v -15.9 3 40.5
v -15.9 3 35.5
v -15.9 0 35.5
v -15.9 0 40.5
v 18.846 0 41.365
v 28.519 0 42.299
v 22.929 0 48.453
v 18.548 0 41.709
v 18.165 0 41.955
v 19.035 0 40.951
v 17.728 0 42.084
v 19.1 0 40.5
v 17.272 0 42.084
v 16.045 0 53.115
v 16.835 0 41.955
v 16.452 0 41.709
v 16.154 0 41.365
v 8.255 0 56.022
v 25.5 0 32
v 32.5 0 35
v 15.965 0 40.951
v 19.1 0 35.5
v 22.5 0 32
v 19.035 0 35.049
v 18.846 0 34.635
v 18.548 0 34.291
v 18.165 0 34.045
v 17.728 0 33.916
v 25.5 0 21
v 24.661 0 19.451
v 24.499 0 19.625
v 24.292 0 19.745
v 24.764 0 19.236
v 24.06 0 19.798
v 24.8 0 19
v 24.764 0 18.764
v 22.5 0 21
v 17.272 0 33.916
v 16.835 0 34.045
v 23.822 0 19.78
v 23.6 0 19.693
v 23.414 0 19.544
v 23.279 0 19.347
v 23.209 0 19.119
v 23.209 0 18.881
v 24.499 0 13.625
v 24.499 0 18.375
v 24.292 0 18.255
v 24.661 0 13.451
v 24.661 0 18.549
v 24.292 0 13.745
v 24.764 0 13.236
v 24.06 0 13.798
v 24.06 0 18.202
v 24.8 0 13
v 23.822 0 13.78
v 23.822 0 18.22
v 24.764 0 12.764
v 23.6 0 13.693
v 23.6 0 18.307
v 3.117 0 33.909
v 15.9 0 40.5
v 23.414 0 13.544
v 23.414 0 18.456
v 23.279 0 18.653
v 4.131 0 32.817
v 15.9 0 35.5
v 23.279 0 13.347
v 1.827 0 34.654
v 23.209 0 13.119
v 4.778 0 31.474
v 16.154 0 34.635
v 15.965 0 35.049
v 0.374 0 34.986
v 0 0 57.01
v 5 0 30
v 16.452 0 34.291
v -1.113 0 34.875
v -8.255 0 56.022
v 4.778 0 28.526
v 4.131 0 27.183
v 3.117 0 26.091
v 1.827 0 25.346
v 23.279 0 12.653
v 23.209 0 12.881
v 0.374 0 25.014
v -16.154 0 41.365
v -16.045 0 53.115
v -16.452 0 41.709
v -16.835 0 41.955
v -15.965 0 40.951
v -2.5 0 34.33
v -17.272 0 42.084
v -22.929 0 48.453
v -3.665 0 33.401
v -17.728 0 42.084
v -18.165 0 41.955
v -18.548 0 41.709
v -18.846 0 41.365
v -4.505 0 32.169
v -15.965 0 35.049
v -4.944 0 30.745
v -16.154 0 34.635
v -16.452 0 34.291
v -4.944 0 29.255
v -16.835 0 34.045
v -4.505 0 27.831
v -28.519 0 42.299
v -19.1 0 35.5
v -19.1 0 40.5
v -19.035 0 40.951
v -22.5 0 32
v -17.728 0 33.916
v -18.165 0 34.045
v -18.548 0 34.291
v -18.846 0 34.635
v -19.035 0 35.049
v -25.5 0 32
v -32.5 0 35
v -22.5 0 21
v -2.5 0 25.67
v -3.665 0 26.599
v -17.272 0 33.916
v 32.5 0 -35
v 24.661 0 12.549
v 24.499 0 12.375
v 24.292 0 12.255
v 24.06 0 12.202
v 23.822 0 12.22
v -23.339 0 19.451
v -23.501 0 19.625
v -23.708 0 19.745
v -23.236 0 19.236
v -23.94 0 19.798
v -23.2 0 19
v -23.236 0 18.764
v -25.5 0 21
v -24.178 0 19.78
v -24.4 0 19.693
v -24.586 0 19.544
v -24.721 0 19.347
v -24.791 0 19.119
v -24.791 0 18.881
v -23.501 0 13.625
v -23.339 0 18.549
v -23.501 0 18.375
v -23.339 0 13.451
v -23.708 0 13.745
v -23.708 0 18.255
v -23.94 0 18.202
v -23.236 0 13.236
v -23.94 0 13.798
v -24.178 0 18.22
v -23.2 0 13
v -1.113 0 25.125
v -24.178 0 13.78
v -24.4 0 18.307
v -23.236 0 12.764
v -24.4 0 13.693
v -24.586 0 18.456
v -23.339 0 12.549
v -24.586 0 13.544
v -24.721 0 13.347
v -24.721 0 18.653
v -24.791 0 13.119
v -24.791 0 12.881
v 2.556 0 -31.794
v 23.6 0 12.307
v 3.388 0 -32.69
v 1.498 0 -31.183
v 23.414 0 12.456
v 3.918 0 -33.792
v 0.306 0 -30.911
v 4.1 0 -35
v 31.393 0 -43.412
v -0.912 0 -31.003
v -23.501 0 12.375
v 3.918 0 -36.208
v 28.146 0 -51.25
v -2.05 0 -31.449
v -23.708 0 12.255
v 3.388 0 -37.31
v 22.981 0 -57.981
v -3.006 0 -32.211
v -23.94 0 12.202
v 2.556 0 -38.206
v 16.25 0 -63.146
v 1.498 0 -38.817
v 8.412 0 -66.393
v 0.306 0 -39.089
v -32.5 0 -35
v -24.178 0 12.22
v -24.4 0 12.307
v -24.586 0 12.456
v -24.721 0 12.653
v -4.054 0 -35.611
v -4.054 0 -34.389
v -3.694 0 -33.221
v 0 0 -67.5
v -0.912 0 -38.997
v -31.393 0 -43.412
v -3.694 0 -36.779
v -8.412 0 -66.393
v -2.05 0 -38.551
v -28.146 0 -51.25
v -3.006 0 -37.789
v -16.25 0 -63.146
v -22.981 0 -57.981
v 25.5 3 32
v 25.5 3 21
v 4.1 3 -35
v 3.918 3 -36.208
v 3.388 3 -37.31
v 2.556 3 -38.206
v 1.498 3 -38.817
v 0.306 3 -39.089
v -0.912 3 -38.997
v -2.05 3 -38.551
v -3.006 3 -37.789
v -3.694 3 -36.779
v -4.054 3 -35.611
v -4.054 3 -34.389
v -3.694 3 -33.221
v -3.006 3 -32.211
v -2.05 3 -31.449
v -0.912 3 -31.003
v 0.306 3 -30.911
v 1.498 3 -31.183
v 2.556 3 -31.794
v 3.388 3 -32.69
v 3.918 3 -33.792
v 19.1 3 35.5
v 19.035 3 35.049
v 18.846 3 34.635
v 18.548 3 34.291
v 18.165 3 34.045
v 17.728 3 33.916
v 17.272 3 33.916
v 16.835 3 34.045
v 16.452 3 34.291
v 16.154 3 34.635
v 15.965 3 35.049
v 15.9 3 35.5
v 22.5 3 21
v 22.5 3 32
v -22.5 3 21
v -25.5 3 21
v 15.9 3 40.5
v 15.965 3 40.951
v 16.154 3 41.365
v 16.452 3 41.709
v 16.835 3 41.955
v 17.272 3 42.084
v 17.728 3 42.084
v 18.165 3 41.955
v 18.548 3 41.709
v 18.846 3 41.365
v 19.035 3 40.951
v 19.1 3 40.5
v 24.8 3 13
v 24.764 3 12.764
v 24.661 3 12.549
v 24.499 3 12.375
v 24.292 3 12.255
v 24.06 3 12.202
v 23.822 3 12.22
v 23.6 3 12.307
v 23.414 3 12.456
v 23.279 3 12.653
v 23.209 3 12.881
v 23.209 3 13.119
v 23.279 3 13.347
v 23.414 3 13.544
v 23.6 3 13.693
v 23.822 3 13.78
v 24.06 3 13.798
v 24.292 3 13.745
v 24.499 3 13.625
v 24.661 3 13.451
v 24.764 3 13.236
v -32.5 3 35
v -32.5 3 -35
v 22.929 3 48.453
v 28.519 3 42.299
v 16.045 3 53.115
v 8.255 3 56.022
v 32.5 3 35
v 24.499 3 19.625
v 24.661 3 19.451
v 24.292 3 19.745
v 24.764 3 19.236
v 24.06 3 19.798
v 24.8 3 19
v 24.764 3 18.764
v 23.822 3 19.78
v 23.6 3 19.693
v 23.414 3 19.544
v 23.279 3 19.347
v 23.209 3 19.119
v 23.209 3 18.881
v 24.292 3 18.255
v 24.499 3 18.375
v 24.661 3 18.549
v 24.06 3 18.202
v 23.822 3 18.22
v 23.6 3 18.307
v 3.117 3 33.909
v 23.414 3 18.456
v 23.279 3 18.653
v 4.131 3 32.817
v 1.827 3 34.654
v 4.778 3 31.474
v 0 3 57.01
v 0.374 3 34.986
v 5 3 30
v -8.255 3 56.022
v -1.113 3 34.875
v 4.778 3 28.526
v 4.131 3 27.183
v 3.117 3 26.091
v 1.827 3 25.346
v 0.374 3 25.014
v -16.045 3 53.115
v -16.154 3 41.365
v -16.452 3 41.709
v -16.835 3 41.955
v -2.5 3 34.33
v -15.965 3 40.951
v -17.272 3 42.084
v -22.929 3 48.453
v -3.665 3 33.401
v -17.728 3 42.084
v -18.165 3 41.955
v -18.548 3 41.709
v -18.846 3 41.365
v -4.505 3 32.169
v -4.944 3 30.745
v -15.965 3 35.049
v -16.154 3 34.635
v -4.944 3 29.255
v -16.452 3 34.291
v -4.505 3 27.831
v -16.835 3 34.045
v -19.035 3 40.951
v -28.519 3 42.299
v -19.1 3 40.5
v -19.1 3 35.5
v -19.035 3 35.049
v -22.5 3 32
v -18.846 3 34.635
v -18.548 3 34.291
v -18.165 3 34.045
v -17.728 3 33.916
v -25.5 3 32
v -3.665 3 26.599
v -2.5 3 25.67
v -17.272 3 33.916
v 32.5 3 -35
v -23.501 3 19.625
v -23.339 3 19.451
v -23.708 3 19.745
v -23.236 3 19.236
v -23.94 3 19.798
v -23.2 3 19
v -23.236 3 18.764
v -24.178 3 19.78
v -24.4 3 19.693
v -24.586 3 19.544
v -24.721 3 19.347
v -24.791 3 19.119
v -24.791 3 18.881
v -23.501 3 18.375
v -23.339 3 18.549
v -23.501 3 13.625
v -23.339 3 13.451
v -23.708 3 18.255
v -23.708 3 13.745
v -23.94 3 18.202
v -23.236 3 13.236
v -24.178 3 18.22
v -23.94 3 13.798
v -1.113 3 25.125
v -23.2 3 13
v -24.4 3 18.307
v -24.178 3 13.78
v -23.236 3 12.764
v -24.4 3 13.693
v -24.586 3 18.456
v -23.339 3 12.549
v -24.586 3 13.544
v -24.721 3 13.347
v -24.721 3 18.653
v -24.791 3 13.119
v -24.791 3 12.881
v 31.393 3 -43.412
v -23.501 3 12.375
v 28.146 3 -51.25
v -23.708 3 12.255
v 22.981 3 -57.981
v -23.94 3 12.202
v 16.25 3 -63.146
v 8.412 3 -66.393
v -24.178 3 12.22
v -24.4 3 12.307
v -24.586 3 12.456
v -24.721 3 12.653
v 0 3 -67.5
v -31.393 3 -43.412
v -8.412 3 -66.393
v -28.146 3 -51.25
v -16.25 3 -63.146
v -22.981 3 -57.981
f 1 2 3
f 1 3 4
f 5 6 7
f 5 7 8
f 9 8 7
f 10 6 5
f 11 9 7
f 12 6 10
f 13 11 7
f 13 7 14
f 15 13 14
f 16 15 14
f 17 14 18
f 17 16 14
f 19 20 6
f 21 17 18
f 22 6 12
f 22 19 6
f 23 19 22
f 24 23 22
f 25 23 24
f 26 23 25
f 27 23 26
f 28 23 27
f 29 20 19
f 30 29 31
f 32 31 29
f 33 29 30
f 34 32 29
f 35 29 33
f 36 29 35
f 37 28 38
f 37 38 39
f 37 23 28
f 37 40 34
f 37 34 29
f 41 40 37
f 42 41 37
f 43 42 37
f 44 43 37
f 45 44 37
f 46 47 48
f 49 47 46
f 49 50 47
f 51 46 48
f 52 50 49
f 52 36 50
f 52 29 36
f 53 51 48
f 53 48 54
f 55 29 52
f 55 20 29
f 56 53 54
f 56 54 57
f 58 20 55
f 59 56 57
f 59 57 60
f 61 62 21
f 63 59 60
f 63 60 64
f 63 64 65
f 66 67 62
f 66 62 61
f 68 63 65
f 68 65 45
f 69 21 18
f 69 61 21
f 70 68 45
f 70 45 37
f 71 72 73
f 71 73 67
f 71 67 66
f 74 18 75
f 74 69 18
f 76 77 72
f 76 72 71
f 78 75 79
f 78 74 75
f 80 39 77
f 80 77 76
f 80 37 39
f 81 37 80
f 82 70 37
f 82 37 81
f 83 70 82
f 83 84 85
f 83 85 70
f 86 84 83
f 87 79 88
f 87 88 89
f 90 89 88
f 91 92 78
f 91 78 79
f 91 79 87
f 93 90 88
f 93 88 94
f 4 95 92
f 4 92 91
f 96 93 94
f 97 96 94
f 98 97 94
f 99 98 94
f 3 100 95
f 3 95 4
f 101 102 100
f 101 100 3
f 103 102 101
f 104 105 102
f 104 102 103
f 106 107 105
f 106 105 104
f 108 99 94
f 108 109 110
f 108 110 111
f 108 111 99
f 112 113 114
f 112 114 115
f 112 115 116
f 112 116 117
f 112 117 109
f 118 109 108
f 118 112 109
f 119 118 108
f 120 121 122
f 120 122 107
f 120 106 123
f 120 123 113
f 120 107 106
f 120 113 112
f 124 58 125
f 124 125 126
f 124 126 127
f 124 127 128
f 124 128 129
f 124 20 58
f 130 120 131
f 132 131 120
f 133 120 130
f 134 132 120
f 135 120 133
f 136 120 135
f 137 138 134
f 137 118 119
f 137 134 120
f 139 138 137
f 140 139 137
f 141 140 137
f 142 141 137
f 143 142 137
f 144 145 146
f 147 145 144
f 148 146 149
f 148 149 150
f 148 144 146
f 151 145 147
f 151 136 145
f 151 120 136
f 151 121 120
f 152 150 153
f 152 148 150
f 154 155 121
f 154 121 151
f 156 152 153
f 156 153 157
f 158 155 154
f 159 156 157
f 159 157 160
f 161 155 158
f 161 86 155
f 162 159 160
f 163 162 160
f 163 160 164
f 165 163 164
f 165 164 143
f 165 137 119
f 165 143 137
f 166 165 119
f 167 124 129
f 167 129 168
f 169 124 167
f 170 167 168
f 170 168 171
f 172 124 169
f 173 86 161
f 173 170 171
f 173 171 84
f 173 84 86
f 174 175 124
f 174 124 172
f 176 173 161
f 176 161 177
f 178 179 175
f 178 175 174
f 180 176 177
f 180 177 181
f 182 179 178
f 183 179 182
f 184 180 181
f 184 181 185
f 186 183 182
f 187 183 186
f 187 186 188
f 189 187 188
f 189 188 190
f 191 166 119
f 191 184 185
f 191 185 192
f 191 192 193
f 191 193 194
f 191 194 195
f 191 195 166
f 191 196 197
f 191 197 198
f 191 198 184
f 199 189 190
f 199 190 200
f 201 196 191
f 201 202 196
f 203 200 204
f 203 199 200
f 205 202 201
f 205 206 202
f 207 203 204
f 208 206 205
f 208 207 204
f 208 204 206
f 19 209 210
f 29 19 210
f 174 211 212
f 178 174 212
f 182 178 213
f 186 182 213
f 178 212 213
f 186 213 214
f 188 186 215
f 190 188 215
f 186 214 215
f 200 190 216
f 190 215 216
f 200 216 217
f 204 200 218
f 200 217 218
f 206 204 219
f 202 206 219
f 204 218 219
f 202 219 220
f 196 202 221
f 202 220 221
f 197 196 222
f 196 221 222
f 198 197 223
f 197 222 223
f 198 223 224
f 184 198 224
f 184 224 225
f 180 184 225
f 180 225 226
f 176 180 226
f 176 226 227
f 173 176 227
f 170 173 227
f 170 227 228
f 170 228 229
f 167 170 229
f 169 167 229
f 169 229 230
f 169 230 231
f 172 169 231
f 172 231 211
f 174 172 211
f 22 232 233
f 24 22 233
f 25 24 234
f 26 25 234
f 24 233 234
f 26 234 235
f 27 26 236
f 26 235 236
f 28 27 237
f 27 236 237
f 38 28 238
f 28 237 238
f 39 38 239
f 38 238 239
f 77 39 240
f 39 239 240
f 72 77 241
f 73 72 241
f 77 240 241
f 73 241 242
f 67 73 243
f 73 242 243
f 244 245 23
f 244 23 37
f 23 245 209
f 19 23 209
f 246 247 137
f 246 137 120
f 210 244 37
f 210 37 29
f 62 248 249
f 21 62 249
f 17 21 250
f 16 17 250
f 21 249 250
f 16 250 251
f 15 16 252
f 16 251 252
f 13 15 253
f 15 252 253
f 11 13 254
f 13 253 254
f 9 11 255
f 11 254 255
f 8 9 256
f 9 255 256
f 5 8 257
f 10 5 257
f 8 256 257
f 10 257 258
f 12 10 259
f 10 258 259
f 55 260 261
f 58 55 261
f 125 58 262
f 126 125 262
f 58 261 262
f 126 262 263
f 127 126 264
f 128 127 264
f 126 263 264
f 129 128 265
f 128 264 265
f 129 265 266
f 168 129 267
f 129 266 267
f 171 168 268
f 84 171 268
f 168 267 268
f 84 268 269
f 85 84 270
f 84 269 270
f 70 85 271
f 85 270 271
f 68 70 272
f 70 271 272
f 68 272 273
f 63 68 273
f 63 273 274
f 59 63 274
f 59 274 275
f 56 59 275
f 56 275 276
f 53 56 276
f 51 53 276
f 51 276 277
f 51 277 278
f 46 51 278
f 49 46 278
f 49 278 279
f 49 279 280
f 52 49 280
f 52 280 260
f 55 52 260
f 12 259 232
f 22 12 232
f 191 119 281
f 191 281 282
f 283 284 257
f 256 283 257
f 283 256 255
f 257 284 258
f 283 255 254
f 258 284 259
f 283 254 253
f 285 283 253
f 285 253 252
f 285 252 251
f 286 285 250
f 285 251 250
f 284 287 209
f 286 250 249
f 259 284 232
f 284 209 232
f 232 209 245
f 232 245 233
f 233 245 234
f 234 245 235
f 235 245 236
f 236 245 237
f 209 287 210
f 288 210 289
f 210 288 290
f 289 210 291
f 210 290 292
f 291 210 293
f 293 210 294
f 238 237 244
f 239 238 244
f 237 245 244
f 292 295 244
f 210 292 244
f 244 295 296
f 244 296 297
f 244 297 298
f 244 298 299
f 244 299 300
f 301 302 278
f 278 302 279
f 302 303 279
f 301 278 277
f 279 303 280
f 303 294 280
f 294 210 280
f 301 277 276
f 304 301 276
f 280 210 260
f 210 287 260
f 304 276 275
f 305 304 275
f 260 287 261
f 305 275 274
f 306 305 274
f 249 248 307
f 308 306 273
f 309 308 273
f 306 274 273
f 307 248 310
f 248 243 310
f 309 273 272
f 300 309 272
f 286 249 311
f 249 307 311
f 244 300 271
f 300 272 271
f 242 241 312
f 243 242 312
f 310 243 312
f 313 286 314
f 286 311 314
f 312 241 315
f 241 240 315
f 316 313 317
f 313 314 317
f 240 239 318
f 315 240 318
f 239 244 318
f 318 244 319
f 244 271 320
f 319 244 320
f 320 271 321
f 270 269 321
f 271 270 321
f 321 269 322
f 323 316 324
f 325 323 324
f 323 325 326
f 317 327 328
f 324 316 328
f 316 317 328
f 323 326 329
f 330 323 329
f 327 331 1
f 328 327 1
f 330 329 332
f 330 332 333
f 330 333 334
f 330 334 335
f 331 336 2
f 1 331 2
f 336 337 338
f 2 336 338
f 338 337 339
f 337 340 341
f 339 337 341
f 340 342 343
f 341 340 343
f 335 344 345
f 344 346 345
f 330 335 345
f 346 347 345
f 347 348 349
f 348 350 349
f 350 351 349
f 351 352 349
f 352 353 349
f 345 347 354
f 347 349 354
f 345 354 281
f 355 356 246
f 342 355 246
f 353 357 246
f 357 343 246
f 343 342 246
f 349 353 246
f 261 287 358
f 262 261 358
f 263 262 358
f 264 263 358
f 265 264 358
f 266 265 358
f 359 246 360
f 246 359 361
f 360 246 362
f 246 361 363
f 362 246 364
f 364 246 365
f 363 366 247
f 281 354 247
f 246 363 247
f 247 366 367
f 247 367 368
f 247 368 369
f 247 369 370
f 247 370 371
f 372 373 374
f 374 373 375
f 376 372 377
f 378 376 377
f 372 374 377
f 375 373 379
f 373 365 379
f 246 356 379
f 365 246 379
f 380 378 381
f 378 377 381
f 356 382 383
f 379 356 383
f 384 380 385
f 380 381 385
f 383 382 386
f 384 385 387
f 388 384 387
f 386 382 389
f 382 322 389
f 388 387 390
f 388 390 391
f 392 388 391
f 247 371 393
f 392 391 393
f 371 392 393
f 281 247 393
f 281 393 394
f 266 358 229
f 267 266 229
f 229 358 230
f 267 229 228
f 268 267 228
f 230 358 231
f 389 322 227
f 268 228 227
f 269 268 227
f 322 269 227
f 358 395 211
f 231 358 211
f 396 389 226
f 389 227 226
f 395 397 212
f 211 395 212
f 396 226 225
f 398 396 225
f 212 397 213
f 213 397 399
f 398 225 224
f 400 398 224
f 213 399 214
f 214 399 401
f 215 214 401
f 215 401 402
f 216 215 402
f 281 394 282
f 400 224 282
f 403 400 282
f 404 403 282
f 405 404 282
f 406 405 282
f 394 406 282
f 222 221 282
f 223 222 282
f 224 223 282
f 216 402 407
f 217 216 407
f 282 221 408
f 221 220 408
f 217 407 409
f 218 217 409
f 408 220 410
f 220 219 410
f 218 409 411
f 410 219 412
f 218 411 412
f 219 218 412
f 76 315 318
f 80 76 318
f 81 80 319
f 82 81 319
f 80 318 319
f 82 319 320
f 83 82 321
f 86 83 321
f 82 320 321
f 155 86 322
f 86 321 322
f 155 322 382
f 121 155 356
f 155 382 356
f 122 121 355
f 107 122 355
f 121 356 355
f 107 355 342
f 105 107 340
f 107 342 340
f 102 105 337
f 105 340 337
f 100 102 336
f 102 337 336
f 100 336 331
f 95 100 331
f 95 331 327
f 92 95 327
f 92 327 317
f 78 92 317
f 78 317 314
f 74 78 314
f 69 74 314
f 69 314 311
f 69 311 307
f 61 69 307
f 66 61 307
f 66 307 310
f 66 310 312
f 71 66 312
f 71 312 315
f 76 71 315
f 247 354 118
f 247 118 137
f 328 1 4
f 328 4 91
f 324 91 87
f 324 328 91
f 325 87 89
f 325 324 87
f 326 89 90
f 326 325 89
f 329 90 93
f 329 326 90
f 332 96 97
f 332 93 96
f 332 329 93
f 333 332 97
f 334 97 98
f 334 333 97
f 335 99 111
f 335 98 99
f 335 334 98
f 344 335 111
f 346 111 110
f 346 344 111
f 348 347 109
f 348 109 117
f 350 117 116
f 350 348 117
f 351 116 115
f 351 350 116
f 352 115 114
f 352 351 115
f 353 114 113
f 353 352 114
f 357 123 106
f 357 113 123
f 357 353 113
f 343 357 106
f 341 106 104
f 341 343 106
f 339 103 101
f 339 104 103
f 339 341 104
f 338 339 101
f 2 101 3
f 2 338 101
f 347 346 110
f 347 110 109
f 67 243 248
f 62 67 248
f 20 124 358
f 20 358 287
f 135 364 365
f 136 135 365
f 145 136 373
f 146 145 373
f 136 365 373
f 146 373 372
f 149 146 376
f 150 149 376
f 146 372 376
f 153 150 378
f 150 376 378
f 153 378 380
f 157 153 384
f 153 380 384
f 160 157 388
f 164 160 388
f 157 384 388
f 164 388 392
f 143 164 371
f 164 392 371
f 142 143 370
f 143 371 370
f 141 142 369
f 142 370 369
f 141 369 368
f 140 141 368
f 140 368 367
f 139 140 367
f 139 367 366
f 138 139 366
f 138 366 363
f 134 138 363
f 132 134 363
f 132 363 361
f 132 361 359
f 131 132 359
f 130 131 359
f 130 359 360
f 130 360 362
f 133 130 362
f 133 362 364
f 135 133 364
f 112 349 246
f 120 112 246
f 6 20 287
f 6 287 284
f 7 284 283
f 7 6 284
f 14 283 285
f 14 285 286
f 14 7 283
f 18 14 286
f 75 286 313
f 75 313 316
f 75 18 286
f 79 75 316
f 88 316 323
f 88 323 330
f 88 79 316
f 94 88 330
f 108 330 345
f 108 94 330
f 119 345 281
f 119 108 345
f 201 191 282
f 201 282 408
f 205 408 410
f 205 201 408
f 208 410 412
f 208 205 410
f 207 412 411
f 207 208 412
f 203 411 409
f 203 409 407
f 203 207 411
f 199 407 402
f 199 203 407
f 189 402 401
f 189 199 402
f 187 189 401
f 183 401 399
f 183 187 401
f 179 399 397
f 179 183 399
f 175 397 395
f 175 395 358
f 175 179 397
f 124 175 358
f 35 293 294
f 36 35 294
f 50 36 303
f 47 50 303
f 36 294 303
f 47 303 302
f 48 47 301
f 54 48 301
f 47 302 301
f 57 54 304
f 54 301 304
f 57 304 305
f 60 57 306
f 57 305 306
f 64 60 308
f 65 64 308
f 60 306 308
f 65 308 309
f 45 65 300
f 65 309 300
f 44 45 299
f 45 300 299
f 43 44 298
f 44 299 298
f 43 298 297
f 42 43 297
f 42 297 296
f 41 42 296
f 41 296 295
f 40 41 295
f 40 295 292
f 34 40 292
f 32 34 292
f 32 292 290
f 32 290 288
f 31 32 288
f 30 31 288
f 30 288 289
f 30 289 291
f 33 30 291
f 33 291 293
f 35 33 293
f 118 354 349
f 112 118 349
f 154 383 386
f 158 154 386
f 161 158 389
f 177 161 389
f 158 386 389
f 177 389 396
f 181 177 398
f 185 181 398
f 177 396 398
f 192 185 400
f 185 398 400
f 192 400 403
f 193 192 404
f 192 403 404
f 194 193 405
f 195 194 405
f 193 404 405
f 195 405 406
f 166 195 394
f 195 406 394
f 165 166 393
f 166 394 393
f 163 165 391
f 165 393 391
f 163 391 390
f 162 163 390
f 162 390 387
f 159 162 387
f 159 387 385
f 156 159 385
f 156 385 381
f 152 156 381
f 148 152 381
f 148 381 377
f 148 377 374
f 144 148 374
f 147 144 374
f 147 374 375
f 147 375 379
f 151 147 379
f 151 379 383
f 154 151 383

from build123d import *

# Parameters (mm, degrees)
BOSS_EXTRUDE1_DEPTH = 3
SKETCH2_R           = 4.1
SKETCH2_R_2         = 5
SKETCH2_R_3         = 1.6
CUT_EXTRUDE1_DEPTH  = 4
SKETCH3_R           = 0.8
SKETCH3_W           = 3
SKETCH3_H           = 11
CUT_EXTRUDE2_DEPTH  = 4
CUT_EXTRUDE3_DEPTH  = 4


with BuildPart() as part:
    # Sketch1 → Boss-Extrude1 (new body)
    with BuildSketch(Plane(origin=(0, 0, 0), x_dir=(1, 0, 0), z_dir=(0, 1, 0))):
        with BuildLine():
            Line((-32.5, -35), (-32.5, 35))
            ThreePointArc((-32.5, 35), (0, 67.5), (32.5, 35))
            Line((32.5, 35), (32.5, -35))
            ThreePointArc((32.5, -35), (0, -57.009618943), (-32.5, -35))
        make_face()
    extrude(amount=BOSS_EXTRUDE1_DEPTH)

    # Sketch2 → Cut-Extrude1 (cut, through all)
    with BuildSketch(Plane(origin=(0, 3, 0), x_dir=(1, 0, 0), z_dir=(0, 1, 0))):
        with Locations((0, 35)):
            Circle(SKETCH2_R)
        with Locations((0, -30)):
            Circle(SKETCH2_R_2)
        with Locations((-17.5, -38)):
            Circle(SKETCH2_R_3)
        with Locations((17.5, -38)):
            Circle(SKETCH2_R_3)
    extrude(amount=-CUT_EXTRUDE1_DEPTH, mode=Mode.SUBTRACT)

    # Sketch3 → Cut-Extrude2 (cut, through all)
    with BuildSketch(Plane(origin=(0, 3, 0), x_dir=(1, 0, 0), z_dir=(0, 1, 0))):
        with Locations((-24, -13)):
            Circle(SKETCH3_R)
        with Locations((-24, -19)):
            Circle(SKETCH3_R)
        with Locations((24, -19)):
            Circle(SKETCH3_R)
        with Locations((24, -13)):
            Circle(SKETCH3_R)
        with Locations((24, -26.5)):
            Rectangle(SKETCH3_W, SKETCH3_H)
        with Locations((-24, -26.5)):
            Rectangle(SKETCH3_W, SKETCH3_H)
    extrude(amount=-CUT_EXTRUDE2_DEPTH, mode=Mode.SUBTRACT)

    # Sketch4 → Cut-Extrude3 (cut, through all)
    with BuildSketch(Plane(origin=(0, 3, 0), x_dir=(1, 0, 0), z_dir=(0, 1, 0))):
        with BuildLine():
            Line((-15.9, -35.5), (-15.9, -40.5))
            ThreePointArc((-15.9, -40.5), (-17.5, -42.1), (-19.1, -40.5))
            Line((-19.1, -40.5), (-19.1, -35.5))
            ThreePointArc((-19.1, -35.5), (-17.5, -33.9), (-15.9, -35.5))
        make_face()
        with BuildLine():
            Line((15.9, -35.5), (15.9, -40.5))
            ThreePointArc((15.9, -40.5), (17.5, -42.1), (19.1, -40.5))
            Line((19.1, -40.5), (19.1, -35.5))
            ThreePointArc((19.1, -35.5), (17.5, -33.9), (15.9, -35.5))
        make_face()
    extrude(amount=-CUT_EXTRUDE3_DEPTH, mode=Mode.SUBTRACT)


solid = part.part
